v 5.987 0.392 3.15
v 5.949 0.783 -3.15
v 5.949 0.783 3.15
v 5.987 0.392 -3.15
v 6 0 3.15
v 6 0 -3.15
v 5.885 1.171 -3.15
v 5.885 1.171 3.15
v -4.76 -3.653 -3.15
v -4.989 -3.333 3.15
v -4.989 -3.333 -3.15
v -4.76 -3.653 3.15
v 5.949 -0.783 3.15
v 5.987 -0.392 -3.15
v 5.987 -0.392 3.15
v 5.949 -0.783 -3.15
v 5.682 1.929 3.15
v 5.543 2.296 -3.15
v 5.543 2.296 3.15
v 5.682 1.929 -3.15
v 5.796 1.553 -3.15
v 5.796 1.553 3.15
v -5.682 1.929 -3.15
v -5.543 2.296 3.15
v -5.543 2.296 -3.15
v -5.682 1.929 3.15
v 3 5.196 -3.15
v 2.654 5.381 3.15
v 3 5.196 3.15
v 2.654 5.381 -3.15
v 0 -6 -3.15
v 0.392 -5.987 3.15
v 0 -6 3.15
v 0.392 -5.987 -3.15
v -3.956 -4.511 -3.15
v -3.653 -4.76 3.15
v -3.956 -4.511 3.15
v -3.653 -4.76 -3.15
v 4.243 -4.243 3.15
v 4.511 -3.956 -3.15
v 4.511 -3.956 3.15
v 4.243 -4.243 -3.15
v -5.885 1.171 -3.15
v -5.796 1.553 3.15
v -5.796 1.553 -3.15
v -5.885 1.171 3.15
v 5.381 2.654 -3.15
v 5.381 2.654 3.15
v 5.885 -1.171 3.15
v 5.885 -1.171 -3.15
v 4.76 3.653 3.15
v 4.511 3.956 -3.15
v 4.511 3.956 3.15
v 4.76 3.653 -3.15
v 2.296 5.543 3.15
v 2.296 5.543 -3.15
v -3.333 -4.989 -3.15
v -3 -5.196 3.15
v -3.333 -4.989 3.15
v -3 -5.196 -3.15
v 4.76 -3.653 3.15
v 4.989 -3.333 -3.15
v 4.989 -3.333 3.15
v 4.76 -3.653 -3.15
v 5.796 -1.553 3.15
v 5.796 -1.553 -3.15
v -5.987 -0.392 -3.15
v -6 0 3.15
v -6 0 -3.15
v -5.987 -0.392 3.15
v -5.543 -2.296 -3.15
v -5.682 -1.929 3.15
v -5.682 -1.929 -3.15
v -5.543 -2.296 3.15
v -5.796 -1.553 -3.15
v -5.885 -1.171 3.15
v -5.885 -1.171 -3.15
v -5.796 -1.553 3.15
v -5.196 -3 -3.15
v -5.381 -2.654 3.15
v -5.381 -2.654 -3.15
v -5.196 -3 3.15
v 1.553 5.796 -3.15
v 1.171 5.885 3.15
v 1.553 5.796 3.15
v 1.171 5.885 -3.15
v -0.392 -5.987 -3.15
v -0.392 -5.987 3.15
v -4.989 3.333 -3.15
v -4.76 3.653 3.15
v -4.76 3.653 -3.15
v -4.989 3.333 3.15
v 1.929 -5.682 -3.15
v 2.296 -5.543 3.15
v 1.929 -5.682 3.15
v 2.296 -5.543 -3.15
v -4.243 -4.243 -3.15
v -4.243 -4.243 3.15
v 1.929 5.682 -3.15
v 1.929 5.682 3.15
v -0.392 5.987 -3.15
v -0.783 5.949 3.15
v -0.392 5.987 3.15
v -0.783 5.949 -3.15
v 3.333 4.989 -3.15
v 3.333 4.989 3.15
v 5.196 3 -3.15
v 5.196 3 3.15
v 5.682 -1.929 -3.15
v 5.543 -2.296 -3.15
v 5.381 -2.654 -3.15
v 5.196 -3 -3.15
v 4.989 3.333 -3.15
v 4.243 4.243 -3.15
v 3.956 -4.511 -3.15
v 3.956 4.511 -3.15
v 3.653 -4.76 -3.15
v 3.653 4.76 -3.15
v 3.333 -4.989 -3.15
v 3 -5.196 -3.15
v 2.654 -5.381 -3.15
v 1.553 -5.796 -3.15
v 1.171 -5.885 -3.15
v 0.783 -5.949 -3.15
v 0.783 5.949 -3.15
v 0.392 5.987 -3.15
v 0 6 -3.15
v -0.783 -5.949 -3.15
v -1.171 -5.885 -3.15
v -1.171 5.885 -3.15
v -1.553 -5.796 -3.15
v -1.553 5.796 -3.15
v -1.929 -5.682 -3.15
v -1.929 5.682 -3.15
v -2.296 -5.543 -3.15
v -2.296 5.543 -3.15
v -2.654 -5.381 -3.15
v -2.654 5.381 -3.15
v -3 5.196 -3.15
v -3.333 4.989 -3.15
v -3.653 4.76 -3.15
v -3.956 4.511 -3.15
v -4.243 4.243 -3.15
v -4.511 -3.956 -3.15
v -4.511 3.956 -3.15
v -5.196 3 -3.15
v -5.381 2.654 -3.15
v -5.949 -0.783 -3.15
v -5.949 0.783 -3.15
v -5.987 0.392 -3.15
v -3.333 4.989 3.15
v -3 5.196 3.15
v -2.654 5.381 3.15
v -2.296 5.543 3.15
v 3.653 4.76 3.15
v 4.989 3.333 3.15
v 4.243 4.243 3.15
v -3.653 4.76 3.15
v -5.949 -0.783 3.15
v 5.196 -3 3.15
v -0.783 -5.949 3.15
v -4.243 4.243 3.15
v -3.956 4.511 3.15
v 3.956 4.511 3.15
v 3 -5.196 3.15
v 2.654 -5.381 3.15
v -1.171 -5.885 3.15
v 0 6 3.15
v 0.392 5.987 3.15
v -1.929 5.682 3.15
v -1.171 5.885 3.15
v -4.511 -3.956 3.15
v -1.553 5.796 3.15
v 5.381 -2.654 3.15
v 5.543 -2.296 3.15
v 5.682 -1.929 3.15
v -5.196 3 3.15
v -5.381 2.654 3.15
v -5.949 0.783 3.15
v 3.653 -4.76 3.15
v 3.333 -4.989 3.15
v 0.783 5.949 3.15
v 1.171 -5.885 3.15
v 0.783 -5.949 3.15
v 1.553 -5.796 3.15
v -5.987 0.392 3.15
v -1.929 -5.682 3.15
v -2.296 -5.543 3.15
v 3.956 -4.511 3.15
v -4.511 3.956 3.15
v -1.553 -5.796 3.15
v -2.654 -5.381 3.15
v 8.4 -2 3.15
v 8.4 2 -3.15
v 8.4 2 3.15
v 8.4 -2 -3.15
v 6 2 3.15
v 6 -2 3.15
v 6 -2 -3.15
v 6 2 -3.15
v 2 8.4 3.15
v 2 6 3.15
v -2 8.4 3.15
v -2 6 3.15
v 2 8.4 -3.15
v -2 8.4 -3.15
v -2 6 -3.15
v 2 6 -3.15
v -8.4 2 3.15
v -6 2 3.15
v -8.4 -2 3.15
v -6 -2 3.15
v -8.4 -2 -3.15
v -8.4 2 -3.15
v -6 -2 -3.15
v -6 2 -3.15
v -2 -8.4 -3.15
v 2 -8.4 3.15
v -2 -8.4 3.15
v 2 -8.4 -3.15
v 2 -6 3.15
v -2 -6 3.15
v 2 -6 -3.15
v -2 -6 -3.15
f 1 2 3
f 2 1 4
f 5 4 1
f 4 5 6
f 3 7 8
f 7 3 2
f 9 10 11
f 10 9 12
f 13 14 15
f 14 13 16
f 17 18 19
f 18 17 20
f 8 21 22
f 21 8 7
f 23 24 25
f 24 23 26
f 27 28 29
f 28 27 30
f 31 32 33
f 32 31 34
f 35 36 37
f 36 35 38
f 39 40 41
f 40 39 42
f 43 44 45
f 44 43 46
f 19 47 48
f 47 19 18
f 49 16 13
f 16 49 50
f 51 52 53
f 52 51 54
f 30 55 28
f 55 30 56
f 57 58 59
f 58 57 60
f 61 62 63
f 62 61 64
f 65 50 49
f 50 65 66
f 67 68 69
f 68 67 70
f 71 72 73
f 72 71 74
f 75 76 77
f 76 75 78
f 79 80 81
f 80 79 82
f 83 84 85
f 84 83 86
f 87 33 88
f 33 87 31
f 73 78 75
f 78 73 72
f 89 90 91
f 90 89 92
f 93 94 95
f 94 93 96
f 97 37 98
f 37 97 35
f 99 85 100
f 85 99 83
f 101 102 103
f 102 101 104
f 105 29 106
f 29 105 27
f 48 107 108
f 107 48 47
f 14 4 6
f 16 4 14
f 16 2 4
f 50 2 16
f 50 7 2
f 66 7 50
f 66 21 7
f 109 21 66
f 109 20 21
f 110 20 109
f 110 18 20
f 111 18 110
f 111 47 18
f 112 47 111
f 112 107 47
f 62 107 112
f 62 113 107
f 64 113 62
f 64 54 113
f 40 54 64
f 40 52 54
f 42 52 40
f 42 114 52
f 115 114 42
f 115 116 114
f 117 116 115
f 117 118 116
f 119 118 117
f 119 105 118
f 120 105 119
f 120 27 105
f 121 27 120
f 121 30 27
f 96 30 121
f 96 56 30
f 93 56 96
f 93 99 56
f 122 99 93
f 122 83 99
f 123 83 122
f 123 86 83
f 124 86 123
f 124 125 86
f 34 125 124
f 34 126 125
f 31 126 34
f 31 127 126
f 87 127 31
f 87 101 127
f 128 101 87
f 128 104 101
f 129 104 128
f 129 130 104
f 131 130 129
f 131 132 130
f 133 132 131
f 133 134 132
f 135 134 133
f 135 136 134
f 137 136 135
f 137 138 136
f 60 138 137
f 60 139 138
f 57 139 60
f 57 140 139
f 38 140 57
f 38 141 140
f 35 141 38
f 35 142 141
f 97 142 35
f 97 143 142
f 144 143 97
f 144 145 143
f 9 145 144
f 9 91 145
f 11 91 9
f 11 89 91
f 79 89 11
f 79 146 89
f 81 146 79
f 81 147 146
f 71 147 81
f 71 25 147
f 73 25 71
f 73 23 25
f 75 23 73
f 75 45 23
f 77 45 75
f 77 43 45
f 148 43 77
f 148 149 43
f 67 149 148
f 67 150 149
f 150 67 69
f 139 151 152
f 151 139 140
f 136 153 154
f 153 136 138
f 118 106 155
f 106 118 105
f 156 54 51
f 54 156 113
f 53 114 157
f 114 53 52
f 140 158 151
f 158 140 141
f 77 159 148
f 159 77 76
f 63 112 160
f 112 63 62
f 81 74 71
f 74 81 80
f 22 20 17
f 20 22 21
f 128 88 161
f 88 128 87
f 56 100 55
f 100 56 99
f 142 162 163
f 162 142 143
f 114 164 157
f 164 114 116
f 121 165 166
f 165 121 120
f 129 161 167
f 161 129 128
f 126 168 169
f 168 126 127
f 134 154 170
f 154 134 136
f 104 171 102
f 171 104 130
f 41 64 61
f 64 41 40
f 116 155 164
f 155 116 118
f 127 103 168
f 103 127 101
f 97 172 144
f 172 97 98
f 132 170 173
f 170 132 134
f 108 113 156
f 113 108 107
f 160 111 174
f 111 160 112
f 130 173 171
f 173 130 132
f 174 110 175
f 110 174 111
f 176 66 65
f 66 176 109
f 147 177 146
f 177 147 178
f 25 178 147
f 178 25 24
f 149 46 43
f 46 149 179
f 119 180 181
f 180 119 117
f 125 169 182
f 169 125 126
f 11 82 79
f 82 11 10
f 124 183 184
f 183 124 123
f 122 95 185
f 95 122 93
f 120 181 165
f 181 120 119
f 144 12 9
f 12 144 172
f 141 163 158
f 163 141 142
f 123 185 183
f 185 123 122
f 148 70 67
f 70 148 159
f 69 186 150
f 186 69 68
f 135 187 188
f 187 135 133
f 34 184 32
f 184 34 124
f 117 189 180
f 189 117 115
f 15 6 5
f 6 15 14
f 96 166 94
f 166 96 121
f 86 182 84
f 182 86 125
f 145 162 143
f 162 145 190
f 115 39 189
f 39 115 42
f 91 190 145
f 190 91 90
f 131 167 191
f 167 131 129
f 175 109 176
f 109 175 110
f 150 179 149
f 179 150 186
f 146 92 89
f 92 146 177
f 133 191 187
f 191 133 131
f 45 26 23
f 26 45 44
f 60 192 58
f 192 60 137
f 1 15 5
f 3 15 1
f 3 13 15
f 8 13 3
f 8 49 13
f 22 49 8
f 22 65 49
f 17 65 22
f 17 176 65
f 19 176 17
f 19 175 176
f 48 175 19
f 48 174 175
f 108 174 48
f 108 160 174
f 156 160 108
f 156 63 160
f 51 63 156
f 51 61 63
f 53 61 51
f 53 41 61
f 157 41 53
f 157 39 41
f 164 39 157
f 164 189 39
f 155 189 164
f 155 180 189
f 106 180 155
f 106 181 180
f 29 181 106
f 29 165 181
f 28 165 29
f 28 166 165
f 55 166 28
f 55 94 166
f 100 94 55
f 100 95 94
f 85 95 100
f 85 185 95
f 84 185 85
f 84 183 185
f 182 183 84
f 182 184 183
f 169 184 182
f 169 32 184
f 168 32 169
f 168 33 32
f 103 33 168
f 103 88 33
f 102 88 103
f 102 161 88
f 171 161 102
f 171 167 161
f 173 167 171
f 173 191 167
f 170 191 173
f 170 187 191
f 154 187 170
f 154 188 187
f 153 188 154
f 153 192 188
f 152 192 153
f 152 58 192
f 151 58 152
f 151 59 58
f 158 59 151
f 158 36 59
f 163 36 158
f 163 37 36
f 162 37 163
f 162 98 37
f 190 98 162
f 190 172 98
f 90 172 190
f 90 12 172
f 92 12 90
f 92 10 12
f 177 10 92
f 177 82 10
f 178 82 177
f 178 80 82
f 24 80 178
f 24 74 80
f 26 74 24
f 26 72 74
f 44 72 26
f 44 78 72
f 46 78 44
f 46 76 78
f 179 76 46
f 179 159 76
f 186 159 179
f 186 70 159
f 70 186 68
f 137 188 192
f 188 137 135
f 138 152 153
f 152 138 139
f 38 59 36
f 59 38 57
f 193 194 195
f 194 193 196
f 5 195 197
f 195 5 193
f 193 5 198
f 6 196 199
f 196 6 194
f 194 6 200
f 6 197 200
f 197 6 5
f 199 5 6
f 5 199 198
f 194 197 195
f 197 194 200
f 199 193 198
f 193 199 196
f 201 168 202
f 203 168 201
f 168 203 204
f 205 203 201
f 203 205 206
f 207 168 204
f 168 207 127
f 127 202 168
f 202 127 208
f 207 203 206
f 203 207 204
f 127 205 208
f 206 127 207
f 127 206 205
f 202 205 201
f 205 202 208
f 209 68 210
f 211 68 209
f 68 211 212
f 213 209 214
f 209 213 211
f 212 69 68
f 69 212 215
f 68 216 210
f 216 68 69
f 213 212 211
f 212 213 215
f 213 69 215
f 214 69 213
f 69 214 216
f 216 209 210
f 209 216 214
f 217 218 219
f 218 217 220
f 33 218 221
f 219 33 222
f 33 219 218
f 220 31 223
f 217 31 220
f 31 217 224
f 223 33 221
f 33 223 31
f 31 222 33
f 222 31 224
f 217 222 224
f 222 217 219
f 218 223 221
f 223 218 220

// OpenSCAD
$fn=96;

bbox_xy = 16.8;
h = 6.3;

core_d = 12.0;

lug_len = (bbox_xy - core_d)/2;   // radial protrusion beyond core radius
lug_w = 4.0;                      // tangential width of lug

module lug(angle=0){
    rotate([0,0,angle])
        translate([core_d/2 + lug_len/2, 0, 0])
            cube([lug_len, lug_w, h], center=true);
}

module part(){
    union(){
        cylinder(d=core_d, h=h, center=true);
        lug(0);
        lug(90);
        lug(180);
        lug(270);
    }
}

part();
